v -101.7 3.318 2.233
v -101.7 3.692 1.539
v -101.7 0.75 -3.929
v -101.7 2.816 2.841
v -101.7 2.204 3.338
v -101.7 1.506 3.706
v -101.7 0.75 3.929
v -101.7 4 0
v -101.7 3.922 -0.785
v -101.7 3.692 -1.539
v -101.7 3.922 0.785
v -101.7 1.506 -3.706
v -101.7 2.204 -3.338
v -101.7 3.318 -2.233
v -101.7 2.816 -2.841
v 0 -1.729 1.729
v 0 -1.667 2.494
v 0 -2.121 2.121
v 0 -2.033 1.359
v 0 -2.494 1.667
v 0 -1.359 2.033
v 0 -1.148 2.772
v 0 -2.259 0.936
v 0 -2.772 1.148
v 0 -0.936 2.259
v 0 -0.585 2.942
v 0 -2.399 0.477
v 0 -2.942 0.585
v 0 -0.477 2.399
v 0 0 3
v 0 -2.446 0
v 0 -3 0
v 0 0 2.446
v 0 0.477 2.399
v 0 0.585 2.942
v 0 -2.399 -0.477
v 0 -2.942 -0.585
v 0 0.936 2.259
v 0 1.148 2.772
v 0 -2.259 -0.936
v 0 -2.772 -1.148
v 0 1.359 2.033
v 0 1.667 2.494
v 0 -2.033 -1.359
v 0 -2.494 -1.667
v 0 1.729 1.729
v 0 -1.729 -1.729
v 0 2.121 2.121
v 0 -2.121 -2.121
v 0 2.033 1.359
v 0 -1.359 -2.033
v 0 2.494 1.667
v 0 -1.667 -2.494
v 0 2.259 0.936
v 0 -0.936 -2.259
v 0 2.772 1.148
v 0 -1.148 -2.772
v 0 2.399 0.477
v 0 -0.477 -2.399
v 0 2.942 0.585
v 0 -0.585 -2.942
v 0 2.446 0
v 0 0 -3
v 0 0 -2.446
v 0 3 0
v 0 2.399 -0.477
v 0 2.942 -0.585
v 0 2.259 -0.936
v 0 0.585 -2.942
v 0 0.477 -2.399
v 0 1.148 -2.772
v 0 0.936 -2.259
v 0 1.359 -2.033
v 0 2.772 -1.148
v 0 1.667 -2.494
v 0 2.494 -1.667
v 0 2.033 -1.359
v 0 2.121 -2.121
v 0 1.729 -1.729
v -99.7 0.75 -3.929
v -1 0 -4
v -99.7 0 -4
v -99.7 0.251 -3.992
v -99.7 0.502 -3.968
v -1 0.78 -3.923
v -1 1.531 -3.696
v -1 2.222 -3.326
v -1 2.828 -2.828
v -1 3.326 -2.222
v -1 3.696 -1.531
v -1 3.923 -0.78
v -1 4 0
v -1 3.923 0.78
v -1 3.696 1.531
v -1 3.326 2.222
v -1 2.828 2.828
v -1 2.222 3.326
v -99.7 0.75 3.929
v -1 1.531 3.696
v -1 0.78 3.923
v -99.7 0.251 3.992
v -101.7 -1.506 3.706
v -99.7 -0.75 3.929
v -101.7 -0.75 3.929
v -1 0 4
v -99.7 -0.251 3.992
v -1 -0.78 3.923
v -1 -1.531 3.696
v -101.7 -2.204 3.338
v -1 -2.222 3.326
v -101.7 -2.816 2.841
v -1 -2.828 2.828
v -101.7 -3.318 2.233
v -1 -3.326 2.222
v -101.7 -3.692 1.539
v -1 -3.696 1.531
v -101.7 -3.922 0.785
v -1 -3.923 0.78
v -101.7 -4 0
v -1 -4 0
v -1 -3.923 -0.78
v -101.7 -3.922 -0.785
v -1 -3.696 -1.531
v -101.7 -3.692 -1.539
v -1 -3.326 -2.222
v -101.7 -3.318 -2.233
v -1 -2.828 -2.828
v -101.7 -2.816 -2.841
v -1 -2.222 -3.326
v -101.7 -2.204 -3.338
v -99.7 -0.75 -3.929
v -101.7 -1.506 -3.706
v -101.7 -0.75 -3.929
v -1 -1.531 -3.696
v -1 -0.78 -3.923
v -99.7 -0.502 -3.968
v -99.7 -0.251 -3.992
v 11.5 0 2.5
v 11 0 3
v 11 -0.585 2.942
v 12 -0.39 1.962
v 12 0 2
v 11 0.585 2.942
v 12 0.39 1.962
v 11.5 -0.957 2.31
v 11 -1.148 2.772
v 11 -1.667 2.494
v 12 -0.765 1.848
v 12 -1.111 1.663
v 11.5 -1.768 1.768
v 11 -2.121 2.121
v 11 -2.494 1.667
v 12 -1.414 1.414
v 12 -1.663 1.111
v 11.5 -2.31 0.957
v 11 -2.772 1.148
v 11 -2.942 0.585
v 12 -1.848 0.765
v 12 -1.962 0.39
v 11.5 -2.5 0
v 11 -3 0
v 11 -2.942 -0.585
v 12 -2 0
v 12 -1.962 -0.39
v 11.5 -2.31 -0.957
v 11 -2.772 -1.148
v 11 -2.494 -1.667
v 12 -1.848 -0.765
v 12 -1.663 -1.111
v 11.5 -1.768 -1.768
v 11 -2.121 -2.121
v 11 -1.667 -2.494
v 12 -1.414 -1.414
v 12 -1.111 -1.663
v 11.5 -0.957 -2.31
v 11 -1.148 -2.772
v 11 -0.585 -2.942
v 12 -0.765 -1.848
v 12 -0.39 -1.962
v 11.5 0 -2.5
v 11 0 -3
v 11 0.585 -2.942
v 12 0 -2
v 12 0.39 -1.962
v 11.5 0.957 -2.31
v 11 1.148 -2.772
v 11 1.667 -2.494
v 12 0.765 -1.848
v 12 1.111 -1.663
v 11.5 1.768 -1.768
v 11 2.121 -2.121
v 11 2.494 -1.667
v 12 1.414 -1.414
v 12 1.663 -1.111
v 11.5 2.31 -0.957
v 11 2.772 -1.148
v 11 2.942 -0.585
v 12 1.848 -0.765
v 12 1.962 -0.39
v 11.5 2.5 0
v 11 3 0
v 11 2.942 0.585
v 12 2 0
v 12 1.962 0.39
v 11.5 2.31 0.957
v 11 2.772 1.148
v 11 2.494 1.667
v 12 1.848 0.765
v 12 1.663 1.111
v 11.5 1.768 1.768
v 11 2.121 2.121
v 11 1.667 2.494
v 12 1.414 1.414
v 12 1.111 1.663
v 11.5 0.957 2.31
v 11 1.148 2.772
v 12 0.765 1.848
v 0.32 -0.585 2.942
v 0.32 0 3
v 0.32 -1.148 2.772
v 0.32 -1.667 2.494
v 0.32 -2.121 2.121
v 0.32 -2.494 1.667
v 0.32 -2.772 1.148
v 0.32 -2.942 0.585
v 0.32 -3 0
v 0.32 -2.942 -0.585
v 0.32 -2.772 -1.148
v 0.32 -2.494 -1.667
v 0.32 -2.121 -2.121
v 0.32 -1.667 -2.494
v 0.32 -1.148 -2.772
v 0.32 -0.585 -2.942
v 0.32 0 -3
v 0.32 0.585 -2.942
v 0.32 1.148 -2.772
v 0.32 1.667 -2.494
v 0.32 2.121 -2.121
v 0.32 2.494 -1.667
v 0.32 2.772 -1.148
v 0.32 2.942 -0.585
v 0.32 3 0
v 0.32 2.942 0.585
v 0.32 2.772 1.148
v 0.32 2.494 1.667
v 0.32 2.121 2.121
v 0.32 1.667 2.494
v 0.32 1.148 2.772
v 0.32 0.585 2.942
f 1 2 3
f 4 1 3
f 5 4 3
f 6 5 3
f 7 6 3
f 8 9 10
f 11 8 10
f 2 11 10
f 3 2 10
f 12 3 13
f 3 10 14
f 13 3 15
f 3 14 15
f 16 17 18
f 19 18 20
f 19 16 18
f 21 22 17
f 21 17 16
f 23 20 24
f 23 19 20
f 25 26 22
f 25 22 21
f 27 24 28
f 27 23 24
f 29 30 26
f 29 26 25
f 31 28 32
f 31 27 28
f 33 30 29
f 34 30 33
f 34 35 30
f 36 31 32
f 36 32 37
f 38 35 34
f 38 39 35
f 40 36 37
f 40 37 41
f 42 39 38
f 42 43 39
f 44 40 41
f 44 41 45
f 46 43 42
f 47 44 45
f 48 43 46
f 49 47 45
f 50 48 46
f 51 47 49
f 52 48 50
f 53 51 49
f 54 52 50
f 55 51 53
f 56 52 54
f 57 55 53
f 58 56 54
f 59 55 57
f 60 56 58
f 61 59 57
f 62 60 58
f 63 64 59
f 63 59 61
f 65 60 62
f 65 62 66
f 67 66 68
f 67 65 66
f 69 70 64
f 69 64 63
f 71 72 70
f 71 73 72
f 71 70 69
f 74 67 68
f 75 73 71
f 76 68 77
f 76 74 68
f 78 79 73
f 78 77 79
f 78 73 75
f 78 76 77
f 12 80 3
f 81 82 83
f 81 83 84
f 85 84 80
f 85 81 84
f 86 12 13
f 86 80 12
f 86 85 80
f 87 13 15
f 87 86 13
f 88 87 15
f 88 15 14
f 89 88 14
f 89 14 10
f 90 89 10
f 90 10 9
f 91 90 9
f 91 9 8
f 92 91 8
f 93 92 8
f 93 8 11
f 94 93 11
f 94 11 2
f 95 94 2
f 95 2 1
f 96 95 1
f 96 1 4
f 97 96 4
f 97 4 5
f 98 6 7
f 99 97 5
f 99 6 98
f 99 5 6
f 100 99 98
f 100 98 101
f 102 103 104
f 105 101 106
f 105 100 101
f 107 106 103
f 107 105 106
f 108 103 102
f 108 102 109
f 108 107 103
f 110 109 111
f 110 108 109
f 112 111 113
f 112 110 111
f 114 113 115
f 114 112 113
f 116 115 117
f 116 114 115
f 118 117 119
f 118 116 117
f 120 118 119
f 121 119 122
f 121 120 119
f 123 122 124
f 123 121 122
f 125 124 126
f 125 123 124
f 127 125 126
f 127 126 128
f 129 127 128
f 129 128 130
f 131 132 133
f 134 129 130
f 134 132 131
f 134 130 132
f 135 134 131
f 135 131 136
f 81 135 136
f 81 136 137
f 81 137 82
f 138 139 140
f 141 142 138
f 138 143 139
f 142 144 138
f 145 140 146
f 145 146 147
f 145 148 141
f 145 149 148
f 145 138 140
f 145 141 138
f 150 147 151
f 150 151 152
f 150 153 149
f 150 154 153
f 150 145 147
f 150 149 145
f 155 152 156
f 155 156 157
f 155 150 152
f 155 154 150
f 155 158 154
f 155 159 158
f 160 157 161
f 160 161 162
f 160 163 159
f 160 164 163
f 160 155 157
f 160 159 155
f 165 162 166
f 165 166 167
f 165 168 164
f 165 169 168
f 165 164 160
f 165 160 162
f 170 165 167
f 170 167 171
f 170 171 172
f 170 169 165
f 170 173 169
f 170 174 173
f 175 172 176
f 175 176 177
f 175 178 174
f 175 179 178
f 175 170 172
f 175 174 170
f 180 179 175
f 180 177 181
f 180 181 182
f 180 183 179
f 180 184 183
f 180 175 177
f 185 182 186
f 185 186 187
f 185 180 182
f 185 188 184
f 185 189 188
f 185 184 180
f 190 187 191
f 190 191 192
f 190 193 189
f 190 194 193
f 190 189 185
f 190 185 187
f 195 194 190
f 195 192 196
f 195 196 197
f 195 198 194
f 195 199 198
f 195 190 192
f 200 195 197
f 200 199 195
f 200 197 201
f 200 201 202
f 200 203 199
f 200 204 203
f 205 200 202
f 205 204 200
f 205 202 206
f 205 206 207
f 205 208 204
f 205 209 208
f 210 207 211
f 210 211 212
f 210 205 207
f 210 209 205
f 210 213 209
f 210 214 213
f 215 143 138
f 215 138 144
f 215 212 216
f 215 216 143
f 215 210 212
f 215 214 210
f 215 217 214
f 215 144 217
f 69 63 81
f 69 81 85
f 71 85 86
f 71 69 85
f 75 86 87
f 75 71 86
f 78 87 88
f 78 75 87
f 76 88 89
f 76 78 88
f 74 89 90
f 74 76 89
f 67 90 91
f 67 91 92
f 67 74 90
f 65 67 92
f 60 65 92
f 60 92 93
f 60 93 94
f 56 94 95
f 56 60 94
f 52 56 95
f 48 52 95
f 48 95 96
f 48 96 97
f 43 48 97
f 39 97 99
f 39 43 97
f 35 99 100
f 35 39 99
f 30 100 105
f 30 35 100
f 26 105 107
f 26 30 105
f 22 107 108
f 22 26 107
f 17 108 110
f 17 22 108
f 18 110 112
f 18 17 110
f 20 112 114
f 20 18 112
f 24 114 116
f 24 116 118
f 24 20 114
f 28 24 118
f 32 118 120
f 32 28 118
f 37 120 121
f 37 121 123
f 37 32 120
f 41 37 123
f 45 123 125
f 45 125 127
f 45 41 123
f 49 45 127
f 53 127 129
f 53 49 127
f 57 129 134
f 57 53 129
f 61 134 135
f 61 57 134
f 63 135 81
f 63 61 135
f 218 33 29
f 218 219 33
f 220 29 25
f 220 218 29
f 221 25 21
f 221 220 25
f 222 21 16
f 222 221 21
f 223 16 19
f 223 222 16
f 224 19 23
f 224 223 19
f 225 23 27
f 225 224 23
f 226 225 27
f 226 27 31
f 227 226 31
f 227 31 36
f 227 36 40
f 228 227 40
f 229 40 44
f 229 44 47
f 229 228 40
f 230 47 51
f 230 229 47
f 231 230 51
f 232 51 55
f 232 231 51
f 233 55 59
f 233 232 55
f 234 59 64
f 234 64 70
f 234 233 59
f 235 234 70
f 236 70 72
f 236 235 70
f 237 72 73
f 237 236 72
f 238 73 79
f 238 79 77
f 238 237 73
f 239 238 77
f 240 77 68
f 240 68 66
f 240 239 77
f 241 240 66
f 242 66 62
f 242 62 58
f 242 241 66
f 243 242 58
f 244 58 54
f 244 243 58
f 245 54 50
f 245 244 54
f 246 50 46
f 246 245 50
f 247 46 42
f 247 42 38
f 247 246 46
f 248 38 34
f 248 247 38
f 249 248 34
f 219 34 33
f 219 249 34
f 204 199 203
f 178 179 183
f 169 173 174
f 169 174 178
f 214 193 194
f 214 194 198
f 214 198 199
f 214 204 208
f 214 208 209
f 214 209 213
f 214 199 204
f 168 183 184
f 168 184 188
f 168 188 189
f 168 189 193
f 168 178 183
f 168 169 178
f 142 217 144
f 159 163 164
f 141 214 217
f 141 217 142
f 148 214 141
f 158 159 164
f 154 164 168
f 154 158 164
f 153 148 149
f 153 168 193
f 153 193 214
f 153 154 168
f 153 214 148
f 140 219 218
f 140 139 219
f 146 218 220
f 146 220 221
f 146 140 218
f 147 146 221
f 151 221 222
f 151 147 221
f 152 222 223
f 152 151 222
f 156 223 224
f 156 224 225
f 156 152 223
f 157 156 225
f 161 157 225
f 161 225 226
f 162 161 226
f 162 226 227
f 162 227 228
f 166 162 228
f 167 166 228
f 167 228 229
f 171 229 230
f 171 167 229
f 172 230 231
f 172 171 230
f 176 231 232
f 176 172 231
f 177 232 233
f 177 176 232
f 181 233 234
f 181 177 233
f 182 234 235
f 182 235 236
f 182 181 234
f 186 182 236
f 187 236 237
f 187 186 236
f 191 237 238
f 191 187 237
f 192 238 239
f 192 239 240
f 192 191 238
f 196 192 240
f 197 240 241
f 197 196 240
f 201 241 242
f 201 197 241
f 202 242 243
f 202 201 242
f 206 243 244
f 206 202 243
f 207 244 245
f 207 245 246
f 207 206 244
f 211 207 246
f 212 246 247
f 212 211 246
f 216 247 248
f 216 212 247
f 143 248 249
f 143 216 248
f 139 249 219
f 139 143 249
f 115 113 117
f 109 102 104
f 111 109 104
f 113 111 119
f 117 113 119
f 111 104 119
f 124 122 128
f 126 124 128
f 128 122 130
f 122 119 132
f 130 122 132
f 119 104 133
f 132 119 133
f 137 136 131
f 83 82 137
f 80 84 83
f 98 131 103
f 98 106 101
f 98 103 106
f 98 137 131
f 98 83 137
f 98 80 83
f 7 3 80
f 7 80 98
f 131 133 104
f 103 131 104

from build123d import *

# Parameters (mm, degrees)
ESBO_O1_R                = 4
RESSALTO_EXTRUS_O1_DEPTH = 101.7
CHANFRO1_SIZE            = 1
ESBO_O2_W                = 8.479156614
ESBO_O2_H                = 1.5
CORTE_EXTRUS_O1_DEPTH    = 2


with BuildPart() as part:
    # BodySke → BaseBody (revolve)
    with BuildSketch(Plane.XY, mode=Mode.PRIVATE) as basebody_sk:
        Polygon((0, 0), (0, 2.4455), (0.320140724, 3), (11, 3), (12, 2), (12, 0), align=None)
    revolve(basebody_sk.sketch.rotate(Axis((-12.7, 0, 0), (1, 0, 0)), 90), axis=Axis((-12.7, 0, 0), (1, 0, 0)))

    # Esboço1 → Ressalto-extrusão1 (add)
    with BuildSketch(Plane(origin=(0, 0, 0), x_dir=(0, 0, -1), z_dir=(1, 0, 0))):
        Circle(ESBO_O1_R)
    extrude(amount=-RESSALTO_EXTRUS_O1_DEPTH)

    # Chanfro1
    chanfro1_edges = [part.edges().sort_by_distance(p)[0] for p in [
        (0, 0, 4),
    ]]
    chamfer(chanfro1_edges, length=CHANFRO1_SIZE)

    # Esboço2 → Corte-extrusão1 (cut)
    with BuildSketch(Plane.ZY.offset(101.7)):
        Rectangle(ESBO_O2_W, ESBO_O2_H)
    extrude(amount=-CORTE_EXTRUS_O1_DEPTH, mode=Mode.SUBTRACT)


solid = part.part
